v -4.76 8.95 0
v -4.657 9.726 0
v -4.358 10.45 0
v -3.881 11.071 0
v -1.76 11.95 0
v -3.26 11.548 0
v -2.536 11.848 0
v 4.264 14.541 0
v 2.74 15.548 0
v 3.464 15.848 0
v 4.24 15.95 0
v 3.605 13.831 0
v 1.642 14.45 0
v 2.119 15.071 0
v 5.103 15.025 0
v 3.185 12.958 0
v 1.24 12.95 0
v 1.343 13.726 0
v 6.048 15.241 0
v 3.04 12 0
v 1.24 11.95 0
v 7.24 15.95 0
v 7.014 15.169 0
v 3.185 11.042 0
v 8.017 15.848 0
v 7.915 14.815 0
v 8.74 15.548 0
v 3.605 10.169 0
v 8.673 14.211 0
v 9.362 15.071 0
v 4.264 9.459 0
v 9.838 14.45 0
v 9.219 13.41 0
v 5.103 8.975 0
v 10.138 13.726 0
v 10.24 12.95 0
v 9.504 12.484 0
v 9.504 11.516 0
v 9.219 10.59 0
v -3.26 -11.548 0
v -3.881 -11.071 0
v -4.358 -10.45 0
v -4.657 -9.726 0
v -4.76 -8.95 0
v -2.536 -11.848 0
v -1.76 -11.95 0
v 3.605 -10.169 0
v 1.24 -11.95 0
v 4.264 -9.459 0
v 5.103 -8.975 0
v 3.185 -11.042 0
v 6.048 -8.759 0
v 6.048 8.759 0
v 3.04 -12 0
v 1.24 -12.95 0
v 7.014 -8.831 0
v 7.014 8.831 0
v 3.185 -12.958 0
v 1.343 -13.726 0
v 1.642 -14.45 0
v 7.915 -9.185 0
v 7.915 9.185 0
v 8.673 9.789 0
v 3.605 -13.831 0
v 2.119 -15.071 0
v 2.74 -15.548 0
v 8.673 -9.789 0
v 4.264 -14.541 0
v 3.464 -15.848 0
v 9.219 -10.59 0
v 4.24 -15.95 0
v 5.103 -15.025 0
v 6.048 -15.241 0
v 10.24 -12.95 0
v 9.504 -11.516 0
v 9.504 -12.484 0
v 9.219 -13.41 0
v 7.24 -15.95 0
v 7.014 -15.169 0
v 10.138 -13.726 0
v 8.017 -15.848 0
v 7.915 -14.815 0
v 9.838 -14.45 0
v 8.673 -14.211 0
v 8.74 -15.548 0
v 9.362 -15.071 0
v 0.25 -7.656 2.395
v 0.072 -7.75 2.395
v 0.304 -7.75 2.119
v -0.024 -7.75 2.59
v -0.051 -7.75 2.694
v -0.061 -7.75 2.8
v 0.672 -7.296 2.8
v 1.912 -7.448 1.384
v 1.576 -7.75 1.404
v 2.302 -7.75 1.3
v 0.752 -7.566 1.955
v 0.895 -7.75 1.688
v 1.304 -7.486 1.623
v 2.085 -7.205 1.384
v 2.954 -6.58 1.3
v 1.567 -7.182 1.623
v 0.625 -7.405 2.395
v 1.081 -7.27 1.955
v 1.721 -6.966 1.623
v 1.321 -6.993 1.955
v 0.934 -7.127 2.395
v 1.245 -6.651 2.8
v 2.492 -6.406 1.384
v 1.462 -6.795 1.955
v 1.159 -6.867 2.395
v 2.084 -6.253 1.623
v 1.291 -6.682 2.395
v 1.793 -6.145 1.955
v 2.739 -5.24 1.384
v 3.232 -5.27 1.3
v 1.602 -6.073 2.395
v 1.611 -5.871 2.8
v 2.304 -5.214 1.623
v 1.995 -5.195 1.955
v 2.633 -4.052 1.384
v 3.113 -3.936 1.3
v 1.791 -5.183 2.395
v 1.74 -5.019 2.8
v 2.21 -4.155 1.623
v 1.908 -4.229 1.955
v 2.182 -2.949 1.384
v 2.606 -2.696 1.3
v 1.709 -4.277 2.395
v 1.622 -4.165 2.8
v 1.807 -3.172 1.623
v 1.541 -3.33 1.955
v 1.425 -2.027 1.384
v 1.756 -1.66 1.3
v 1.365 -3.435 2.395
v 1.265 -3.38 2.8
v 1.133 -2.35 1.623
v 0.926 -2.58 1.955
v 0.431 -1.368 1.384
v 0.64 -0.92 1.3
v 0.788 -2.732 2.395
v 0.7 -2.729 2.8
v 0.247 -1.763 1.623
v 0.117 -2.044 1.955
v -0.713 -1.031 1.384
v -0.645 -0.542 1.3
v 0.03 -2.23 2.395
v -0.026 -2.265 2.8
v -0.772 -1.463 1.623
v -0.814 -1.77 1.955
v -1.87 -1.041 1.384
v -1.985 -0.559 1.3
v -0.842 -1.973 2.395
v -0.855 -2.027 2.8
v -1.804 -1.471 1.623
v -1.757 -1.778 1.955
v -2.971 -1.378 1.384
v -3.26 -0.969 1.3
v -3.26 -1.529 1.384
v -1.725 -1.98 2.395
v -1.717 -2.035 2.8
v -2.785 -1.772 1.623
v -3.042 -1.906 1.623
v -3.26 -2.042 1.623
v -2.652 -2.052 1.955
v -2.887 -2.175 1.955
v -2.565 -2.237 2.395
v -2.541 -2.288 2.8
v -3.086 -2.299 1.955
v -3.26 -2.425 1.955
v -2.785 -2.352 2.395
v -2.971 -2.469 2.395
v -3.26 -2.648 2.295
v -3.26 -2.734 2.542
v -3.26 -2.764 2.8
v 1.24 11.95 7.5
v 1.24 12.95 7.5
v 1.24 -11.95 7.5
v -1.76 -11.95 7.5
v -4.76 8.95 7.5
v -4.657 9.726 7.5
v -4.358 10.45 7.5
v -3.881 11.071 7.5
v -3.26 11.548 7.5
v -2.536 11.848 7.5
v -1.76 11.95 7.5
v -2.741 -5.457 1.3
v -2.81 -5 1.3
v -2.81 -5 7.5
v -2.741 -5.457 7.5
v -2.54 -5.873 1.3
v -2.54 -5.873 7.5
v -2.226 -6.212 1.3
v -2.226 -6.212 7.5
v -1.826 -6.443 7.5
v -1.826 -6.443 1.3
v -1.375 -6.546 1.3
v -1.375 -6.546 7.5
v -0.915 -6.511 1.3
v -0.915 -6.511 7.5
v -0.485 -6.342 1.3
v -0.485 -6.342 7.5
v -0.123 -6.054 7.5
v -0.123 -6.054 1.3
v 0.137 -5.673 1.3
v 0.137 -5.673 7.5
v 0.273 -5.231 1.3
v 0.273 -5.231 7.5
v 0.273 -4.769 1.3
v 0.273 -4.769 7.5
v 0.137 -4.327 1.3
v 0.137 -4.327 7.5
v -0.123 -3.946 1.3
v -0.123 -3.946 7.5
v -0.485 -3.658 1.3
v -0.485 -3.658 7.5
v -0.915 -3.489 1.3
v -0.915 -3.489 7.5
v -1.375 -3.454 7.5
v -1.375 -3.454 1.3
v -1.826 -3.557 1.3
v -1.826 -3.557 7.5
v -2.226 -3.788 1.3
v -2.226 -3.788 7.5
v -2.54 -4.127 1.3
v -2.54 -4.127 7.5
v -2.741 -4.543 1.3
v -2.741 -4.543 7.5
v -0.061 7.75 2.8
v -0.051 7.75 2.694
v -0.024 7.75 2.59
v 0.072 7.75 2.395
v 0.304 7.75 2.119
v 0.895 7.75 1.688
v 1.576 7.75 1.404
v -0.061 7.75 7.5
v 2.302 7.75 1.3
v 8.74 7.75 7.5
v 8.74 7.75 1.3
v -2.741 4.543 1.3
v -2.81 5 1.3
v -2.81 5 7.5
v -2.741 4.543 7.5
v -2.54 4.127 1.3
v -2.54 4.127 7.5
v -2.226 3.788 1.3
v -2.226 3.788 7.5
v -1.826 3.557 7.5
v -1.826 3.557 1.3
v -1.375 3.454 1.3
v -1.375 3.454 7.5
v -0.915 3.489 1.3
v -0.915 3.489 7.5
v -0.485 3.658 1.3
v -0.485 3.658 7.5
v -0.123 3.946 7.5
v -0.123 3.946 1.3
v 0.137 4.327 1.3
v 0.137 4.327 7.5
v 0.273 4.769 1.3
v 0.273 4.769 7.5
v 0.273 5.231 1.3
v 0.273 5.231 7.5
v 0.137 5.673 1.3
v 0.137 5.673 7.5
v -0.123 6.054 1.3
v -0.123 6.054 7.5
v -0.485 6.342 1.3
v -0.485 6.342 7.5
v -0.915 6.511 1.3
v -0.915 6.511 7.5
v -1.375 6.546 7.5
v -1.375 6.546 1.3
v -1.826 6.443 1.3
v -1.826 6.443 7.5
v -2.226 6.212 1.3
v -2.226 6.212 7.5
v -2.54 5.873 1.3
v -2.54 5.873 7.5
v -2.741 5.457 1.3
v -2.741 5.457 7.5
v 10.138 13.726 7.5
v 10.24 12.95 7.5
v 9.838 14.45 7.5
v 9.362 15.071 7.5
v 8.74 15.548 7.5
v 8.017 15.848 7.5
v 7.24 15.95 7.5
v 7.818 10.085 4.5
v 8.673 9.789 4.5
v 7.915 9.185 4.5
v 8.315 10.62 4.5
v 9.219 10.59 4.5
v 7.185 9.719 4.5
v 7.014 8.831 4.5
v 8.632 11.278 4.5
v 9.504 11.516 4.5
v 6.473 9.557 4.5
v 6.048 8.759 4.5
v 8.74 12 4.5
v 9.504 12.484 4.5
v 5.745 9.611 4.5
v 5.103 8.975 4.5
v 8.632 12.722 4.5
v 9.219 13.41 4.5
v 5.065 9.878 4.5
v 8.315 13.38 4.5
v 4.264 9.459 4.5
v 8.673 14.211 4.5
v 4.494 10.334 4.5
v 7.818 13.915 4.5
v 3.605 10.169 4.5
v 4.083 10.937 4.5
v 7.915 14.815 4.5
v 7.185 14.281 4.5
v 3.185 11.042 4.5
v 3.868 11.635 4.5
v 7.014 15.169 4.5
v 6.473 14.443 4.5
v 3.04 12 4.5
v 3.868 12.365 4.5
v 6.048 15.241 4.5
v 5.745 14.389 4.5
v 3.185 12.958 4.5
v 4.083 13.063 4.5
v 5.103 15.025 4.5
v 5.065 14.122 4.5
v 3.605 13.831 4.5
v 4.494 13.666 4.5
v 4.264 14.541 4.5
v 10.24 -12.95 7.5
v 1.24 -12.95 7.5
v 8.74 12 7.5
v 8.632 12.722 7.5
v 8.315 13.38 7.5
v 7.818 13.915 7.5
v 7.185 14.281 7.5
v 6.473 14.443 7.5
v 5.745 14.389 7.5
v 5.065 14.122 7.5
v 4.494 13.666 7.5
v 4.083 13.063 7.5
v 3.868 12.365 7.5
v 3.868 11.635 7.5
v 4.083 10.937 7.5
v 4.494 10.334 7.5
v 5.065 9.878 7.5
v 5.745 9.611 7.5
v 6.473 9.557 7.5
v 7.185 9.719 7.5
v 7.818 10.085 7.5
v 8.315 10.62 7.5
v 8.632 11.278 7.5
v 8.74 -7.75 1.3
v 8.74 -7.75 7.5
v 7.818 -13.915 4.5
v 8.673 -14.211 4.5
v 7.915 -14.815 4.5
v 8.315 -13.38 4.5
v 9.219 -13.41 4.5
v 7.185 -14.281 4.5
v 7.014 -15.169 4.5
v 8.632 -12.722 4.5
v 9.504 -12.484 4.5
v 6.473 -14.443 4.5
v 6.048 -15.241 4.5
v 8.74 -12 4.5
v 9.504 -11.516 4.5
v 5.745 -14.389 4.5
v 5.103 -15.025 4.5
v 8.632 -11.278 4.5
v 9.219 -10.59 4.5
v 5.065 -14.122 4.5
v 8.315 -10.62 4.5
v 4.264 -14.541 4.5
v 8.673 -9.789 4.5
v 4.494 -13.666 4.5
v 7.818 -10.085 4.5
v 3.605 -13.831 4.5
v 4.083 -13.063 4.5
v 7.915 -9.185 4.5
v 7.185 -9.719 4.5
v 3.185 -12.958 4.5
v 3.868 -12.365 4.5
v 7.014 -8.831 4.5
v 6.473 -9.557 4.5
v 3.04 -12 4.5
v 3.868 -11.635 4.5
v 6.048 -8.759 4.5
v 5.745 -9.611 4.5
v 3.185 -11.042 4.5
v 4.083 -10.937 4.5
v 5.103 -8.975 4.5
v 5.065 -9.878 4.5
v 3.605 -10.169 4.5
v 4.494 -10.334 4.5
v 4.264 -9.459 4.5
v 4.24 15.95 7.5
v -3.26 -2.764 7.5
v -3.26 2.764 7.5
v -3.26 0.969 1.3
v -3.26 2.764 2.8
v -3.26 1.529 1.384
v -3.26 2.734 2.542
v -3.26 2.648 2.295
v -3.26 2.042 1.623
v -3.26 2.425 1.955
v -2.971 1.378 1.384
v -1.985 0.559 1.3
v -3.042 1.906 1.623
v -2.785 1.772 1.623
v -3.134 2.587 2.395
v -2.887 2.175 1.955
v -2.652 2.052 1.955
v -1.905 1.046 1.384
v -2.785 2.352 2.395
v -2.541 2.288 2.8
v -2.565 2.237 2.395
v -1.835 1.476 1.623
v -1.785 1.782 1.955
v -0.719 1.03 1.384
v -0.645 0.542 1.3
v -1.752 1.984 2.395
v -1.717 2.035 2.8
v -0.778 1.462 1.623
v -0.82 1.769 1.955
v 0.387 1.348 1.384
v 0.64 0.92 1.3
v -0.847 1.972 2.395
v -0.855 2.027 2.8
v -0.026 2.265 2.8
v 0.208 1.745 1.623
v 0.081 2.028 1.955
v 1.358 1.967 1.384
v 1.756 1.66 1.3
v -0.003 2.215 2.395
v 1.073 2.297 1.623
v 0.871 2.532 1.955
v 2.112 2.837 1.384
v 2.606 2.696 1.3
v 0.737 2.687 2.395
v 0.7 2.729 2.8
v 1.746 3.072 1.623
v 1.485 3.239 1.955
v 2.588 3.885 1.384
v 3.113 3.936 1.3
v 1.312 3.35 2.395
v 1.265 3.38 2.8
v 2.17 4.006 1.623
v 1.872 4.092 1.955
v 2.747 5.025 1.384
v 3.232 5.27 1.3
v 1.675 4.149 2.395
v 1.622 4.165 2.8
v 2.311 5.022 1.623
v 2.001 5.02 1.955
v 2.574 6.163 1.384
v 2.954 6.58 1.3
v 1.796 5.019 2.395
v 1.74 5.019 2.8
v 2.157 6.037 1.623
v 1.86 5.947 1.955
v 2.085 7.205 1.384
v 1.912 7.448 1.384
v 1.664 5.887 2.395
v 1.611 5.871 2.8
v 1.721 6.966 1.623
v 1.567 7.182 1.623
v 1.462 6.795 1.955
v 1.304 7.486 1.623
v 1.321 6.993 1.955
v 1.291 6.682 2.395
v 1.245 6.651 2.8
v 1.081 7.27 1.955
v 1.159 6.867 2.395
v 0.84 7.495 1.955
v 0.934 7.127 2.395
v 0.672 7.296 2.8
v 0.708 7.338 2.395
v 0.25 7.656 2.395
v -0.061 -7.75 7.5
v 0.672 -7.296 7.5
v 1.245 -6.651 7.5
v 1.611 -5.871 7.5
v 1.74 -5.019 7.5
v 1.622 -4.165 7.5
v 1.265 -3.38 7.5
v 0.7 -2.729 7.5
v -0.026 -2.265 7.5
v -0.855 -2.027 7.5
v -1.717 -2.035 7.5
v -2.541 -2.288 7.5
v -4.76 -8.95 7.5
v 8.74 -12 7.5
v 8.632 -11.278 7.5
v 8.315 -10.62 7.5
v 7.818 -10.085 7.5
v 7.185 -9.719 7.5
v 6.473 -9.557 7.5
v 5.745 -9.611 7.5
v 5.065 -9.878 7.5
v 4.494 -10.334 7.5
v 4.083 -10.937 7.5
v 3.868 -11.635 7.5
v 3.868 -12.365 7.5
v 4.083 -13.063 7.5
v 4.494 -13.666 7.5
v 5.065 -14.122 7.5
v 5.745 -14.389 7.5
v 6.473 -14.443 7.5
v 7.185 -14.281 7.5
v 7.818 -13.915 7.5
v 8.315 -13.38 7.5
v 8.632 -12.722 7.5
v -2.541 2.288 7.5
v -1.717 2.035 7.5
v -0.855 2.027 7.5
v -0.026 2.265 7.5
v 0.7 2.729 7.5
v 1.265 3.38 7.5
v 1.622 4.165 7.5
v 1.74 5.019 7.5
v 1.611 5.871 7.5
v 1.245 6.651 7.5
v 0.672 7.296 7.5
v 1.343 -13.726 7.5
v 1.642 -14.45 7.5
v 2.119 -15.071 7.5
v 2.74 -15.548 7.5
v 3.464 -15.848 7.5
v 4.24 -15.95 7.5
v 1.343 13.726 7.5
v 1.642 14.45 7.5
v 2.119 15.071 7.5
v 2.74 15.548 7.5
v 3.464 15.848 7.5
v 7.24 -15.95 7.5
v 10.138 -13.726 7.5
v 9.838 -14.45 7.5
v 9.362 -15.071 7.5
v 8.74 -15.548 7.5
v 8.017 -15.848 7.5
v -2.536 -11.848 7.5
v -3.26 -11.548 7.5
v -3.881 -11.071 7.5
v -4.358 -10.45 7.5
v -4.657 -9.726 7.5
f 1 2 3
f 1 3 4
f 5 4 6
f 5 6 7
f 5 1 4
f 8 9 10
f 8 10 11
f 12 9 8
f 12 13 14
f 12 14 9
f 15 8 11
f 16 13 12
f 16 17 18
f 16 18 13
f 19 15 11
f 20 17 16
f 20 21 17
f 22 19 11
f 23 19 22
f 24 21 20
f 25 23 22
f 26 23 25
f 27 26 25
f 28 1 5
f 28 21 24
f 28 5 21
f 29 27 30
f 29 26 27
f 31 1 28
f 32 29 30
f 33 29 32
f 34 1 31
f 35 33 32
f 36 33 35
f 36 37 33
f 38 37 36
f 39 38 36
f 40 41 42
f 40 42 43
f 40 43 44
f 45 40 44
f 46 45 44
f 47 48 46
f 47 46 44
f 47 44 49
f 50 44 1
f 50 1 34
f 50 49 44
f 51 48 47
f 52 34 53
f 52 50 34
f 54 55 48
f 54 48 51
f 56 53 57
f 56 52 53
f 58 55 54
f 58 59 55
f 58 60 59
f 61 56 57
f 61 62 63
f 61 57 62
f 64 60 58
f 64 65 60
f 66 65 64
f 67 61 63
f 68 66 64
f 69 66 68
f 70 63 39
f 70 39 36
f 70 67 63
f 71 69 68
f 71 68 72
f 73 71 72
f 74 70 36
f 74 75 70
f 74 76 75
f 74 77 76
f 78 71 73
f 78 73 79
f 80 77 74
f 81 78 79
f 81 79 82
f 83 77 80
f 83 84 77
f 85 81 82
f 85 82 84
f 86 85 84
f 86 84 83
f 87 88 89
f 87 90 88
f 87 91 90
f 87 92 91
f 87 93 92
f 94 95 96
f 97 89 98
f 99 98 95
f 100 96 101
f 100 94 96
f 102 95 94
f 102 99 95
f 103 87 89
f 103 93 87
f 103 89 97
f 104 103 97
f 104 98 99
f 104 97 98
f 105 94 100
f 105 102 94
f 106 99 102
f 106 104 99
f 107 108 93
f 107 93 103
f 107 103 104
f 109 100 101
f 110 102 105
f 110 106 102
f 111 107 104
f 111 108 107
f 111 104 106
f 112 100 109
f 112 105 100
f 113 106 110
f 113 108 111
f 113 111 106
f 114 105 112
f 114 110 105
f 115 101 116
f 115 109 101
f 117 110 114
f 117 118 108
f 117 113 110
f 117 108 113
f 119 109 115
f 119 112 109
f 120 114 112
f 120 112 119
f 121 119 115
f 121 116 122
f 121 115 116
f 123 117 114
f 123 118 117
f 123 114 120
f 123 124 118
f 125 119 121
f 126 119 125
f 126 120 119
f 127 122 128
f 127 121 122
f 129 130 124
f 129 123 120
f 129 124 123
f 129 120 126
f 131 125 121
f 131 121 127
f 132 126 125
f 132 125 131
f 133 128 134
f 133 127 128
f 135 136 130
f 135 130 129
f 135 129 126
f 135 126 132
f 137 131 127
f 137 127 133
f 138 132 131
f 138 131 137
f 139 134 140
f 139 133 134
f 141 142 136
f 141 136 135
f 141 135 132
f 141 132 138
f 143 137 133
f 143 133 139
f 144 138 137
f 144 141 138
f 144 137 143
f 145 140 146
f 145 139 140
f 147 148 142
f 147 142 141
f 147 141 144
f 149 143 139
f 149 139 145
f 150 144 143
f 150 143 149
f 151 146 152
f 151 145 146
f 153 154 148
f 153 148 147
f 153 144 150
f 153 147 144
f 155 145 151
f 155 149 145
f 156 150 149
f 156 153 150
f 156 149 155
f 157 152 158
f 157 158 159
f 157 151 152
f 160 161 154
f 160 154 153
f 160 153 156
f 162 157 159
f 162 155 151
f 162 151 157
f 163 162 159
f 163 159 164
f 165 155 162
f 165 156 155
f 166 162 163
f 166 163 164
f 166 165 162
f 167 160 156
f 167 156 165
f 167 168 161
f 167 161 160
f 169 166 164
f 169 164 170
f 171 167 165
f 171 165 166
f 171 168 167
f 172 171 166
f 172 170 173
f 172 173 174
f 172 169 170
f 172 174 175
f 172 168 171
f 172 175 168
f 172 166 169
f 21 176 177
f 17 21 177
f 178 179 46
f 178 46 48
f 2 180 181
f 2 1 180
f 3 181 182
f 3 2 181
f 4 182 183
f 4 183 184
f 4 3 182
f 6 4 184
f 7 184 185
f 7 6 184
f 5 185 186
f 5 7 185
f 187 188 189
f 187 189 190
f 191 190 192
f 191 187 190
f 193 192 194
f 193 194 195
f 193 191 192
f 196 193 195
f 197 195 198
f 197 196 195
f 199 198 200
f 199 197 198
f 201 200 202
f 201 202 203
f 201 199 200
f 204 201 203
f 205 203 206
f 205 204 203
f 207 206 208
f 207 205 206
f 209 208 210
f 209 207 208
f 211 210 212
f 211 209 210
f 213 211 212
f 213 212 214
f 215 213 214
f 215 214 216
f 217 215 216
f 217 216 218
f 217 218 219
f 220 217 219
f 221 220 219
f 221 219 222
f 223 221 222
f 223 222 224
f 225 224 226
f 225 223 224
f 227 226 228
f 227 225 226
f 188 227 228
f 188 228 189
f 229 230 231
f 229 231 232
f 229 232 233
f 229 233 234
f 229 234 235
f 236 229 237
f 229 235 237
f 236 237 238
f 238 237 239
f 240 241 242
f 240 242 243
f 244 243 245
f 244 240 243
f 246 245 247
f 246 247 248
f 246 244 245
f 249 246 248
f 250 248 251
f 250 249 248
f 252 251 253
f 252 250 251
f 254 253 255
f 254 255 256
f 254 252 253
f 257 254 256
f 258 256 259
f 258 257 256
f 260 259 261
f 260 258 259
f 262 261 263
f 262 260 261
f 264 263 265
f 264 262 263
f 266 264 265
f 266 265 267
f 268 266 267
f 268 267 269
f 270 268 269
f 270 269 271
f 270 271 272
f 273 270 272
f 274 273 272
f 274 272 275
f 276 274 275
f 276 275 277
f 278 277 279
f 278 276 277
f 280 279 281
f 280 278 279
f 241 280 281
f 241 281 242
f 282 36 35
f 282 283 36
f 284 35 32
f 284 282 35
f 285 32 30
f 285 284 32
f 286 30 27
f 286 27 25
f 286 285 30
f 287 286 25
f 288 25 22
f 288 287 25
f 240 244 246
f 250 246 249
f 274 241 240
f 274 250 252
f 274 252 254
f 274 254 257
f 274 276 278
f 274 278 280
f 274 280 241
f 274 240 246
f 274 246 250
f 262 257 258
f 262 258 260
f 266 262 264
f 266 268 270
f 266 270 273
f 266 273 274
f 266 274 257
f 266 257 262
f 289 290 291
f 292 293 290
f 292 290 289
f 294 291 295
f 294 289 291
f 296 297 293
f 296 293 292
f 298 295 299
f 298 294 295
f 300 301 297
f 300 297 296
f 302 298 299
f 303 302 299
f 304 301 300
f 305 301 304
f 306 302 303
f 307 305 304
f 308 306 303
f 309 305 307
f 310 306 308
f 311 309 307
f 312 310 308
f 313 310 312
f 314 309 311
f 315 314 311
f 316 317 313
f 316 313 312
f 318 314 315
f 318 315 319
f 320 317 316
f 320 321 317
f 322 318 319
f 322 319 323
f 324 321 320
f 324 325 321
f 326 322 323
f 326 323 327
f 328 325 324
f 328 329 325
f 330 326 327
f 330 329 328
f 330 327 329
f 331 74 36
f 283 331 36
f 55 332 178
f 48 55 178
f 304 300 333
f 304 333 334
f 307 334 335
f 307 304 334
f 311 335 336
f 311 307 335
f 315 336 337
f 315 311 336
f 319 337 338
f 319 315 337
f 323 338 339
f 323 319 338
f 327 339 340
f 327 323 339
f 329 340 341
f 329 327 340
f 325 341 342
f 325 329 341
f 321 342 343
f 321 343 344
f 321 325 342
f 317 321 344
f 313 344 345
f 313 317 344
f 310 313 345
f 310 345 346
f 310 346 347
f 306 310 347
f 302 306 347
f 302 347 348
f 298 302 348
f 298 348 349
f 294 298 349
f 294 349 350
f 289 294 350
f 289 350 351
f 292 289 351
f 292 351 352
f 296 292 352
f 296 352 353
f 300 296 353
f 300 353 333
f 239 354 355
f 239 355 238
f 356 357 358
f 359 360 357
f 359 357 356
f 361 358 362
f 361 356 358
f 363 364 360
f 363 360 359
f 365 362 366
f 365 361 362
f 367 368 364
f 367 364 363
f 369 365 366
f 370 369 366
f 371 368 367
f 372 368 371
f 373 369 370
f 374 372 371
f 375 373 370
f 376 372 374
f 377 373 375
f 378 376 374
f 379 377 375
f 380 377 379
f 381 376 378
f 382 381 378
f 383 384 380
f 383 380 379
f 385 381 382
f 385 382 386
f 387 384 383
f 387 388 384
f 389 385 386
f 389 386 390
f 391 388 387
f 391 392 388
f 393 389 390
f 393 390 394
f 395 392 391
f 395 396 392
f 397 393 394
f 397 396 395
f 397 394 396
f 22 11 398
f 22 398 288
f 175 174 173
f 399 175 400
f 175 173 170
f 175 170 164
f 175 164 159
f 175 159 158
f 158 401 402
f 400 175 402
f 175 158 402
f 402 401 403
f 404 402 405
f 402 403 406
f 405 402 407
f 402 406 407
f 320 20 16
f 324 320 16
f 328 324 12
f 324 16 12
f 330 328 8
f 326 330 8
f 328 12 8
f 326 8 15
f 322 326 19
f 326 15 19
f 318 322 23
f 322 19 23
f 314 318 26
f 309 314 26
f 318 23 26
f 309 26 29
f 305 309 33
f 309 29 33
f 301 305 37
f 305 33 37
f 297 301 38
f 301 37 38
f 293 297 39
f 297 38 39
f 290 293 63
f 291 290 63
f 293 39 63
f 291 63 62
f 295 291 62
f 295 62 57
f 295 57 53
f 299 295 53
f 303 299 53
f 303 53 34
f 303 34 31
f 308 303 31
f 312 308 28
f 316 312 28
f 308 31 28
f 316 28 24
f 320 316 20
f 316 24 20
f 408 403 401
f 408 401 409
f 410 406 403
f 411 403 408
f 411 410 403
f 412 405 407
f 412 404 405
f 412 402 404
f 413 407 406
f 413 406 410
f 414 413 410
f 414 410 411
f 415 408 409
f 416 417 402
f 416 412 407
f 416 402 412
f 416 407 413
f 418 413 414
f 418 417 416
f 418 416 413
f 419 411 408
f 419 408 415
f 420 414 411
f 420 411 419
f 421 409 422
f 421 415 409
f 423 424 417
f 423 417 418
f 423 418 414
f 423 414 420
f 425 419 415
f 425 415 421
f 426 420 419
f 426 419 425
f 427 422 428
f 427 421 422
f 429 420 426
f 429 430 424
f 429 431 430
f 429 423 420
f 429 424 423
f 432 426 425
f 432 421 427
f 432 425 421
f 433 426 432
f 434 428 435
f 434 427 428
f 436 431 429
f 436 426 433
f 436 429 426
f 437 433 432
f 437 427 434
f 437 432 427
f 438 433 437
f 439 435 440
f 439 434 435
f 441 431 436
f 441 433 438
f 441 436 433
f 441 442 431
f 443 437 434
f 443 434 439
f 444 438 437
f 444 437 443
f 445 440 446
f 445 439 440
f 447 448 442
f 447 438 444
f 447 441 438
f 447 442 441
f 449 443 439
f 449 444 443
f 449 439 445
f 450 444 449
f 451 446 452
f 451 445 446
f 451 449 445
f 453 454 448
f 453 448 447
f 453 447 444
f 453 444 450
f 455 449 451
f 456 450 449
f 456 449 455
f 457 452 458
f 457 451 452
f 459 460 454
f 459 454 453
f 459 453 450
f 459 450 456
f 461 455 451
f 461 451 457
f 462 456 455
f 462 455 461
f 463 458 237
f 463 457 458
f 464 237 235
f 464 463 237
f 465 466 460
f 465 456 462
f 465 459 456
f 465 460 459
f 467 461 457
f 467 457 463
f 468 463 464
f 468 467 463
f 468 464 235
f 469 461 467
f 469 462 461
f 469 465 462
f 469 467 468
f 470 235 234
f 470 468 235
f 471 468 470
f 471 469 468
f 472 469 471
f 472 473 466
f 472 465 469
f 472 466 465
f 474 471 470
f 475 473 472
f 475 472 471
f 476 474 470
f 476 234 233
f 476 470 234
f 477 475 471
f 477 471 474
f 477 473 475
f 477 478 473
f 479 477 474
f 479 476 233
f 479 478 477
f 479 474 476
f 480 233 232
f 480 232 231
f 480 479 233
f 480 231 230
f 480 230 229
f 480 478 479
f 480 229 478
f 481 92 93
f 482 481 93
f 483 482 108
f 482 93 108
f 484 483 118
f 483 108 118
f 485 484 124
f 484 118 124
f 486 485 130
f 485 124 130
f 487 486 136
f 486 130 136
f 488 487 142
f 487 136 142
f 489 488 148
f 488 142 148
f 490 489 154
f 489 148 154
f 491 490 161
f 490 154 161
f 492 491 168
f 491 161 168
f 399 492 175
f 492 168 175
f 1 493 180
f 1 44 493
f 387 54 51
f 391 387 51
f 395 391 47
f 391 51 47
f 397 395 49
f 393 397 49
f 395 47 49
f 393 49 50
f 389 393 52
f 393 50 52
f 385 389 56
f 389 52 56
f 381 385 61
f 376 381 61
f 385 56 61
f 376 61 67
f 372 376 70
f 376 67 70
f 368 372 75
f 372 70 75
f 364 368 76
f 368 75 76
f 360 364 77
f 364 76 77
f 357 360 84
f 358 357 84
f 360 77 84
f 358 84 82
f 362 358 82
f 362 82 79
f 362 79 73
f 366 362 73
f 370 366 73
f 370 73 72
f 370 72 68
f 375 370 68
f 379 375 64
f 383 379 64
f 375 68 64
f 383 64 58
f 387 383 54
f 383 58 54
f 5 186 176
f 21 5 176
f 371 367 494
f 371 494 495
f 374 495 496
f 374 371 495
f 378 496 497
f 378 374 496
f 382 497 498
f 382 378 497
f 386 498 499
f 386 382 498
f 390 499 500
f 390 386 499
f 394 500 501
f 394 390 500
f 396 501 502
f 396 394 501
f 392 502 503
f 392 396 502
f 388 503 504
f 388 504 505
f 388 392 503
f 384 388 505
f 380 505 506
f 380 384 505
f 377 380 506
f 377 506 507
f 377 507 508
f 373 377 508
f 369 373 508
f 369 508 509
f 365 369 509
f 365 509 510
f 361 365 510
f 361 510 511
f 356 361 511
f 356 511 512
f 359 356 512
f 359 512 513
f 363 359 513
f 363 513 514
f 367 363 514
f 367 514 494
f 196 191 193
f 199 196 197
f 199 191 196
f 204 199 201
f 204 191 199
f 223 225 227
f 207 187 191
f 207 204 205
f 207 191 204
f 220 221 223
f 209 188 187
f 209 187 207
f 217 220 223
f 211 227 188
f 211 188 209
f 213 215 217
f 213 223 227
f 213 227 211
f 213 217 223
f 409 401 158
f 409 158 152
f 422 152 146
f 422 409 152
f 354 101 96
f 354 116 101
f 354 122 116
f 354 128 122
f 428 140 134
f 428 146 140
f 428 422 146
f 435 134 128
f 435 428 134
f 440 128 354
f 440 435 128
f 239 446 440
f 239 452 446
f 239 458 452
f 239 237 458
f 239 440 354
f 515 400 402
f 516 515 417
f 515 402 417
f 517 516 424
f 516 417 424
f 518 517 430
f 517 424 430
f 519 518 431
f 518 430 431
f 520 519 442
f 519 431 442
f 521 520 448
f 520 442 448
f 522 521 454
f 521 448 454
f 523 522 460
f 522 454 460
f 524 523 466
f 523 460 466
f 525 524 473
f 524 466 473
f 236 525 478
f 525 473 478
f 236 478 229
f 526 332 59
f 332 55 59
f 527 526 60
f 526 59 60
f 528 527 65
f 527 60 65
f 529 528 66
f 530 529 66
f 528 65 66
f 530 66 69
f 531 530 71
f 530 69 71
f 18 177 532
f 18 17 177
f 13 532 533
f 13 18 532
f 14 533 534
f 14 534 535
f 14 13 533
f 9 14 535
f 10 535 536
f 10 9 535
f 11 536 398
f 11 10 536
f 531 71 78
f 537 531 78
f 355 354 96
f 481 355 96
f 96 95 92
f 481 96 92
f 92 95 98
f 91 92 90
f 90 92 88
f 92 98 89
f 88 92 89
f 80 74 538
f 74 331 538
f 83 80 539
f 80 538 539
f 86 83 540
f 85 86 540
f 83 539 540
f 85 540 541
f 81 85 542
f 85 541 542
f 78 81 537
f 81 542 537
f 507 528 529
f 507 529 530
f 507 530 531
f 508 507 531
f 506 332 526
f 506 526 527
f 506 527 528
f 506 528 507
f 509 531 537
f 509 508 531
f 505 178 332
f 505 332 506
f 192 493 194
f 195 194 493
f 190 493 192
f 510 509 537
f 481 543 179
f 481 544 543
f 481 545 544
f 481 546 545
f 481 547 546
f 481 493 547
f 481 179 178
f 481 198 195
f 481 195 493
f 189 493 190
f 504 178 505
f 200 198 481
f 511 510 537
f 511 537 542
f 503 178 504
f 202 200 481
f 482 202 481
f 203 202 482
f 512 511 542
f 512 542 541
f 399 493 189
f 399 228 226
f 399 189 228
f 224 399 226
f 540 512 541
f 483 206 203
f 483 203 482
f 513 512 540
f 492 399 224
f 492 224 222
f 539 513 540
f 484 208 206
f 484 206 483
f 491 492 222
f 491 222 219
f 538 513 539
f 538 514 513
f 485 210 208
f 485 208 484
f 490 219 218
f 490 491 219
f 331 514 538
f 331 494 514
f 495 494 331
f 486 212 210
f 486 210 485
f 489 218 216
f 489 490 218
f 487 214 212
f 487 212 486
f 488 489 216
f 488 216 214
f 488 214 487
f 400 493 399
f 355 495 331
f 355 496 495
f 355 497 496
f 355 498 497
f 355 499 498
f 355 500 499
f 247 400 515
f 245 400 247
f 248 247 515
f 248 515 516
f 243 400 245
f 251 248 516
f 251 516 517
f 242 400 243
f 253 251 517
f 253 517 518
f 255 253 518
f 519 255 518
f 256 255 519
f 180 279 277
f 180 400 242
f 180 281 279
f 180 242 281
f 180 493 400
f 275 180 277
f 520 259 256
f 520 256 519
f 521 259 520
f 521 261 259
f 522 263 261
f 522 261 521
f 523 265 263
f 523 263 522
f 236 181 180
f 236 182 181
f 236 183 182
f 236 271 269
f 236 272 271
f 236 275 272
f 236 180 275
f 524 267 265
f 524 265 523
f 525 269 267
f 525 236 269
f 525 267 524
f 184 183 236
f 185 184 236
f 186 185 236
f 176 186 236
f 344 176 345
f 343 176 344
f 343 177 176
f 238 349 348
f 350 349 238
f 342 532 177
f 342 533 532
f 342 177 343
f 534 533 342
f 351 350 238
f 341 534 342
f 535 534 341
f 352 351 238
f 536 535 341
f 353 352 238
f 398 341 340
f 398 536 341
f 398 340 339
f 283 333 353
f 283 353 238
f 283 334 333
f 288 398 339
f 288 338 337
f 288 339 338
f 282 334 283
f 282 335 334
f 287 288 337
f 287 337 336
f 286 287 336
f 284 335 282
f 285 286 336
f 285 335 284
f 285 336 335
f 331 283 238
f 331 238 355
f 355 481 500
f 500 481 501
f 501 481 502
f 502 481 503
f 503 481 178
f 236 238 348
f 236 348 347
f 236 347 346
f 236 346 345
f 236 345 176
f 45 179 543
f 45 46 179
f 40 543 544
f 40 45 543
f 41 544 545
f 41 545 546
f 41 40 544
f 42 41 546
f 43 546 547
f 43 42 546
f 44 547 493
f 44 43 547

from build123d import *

# Parameters (mm, degrees)
SKETCH1_W                       = 20.480821918
SKETCH1_H                       = 31.9
SKETCH1_R                       = 2.45
BOSS_EXTRUDE1_DEPTH             = 7.5
SKETCH2_W                       = 18.980821918
SKETCH2_H                       = 9.35
CUT_EXTRUDE1_DEPTH              = 6.2
CUT_EXTRUDE2_REACH              = 22.384
SKETCH5_W                       = 5.480821918
SKETCH5_H                       = 31.9
SKETCH3_R                       = 3
SKETCH3_R_2                     = 1.55
BOSS_EXTRUDE4_DEPTH             = 6.2
SKETCH6_W                       = 1.5
SKETCH6_H                       = 15.5
CUT_EXTRUDE3_DEPTH              = 6.2
SKETCH7_W                       = 1.5
SKETCH7_H                       = 18.7
BOSS_EXTRUDE5_DEPTH             = 6.2
FILLET1_R                       = 3
SKETCH8_W                       = 6
SKETCH8_H                       = 4
CUT_EXTRUDE4_DEPTH              = 7.5
FILLET2_R                       = 3
BOSS_EXTRUDE6_REACH             = 21.943
BOSS_EXTRUDE6_DIRECTION_2_REACH = 21.943
SKETCH10_R                      = 3.25
CUT_EXTRUDE6_DEPTH              = 4.5
FILLET3_R                       = 1.5
SKETCH12_W                      = 1.5
SKETCH12_H                      = 15.5
BOSS_EXTRUDE7_DEPTH             = 6.2


with BuildPart() as part:
    # Sketch1 → Boss-Extrude1 (new body)
    with BuildSketch(Plane.XY):
        Rectangle(SKETCH1_W, SKETCH1_H)
        with Locations((6.290410959, 12)):
            Circle(SKETCH1_R, mode=Mode.SUBTRACT)
        with Locations((6.290410959, -12)):
            Circle(SKETCH1_R, mode=Mode.SUBTRACT)
    extrude(amount=BOSS_EXTRUDE1_DEPTH)

    # Sketch2 → Cut-Extrude1 (cut)
    with BuildSketch(Plane.XY.offset(7.5)):
        with Locations((-0.75, 4.675)):
            Rectangle(SKETCH2_W, SKETCH2_H)
        with Locations((-0.75, -4.675)):
            Rectangle(SKETCH2_W, SKETCH2_H)
    extrude(amount=-CUT_EXTRUDE1_DEPTH, mode=Mode.SUBTRACT)

    # Cut-Extrude2: up to this face of the body (flat: up to its plane)
    cut_extrude2_end = Plane(part.part.faces().sort_by_distance((-0.385368256, 0, 0))[0])
    # Sketch5 → Cut-Extrude2 (cut, up to the picked face)
    with BuildSketch(Plane.XY.offset(7.5), mode=Mode.PRIVATE) as cut_extrude2_sk1:
        with Locations((-7.5, 0)):
            Rectangle(SKETCH5_W, SKETCH5_H)
    cut_extrude2_tool1 = split(extrude(cut_extrude2_sk1.sketch, amount=-CUT_EXTRUDE2_REACH, mode=Mode.PRIVATE), bisect_by=cut_extrude2_end, keep=Keep.BOTH, mode=Mode.PRIVATE)
    add(cut_extrude2_tool1.solids().sort_by(Axis((-7.5, 0, 7.5), (0, 0, -1)))[0], mode=Mode.SUBTRACT)

    # Sketch3 → Boss-Extrude4 (add)
    # profile 1 of 2: a face of its own
    with BuildSketch(Plane.XY.offset(1.3)):
        with Locations(Location((-1.259589041, 5, 0), (0, 0, 180))):
            Circle(SKETCH3_R)
        with Locations(Location((-1.259589041, 5, 0), (0, 0, 180))):
            Circle(SKETCH3_R_2, mode=Mode.SUBTRACT)
    # profile 2 of 2: a face of its own
    with BuildSketch(Plane.XY.offset(1.3)):
        with Locations(Location((-1.259589041, -5, 0), (0, 0, 180))):
            Circle(SKETCH3_R)
        with Locations(Location((-1.259589041, -5, 0), (0, 0, 180))):
            Circle(SKETCH3_R_2, mode=Mode.SUBTRACT)
    extrude(amount=BOSS_EXTRUDE4_DEPTH)

    # Sketch6 → Cut-Extrude3 (cut)
    with BuildSketch(Plane.XY.offset(7.5)):
        with Locations((9.490410959, 0)):
            Rectangle(SKETCH6_W, SKETCH6_H)
    extrude(amount=-CUT_EXTRUDE3_DEPTH, mode=Mode.SUBTRACT)

    # Sketch7 → Boss-Extrude5 (add)
    with BuildSketch(Plane.XY.offset(1.3)):
        with Locations((-4.009589041, 0)):
            Rectangle(SKETCH7_W, SKETCH7_H)
    extrude(amount=BOSS_EXTRUDE5_DEPTH)

    # Fillet1
    fillet1_edges = [part.edges().sort_by_distance(p)[0] for p in [
        (10.240410959, 15.95, 3.75),
        (10.240410959, -15.95, 3.75),
    ]]
    fillet(fillet1_edges, radius=FILLET1_R)

    # Sketch8 → Cut-Extrude4 (cut)
    with BuildSketch(Plane.XY.offset(7.5)):
        with Locations((-1.759589041, 13.95)):
            Rectangle(SKETCH8_W, SKETCH8_H)
        with Locations((-1.759589041, -13.95)):
            Rectangle(SKETCH8_W, SKETCH8_H)
    extrude(amount=-CUT_EXTRUDE4_DEPTH, mode=Mode.SUBTRACT)

    # Fillet2
    fillet2_edges = [part.edges().sort_by_distance(p)[0] for p in [
        (1.240410959, 15.95, 3.75),
        (-4.759589041, 11.95, 3.75),
        (1.240410959, -15.95, 3.75),
        (-4.759589041, -11.95, 3.75),
    ]]
    fillet(fillet2_edges, radius=FILLET2_R)

    # Boss-Extrude6: up to this face of the body (flat: up to its plane)
    boss_extrude6_end = Plane(part.part.faces().sort_by_distance((5.740410959, -15.597493262, 7.5))[0])
    # Sketch11 → Boss-Extrude6 (add, up to the picked face)
    with BuildSketch(Plane.XY.offset(1.3), mode=Mode.PRIVATE) as boss_extrude6_sk1:
        with BuildLine():
            Line((-3.259589041, 9.35), (-3.259589041, 7.236067977))
            ThreePointArc((-3.259589041, 7.236067977), (-1.735455251, 7.962018121), (-0.06063116, 7.75))
            Line((-0.06063116, 7.75), (8.740410959, 7.75))
            Line((8.740410959, 7.75), (8.740410959, 9.35))
            Line((8.740410959, 9.35), (-3.259589041, 9.35))
        make_face()
    boss_extrude6_tool1 = split(extrude(boss_extrude6_sk1.sketch, amount=BOSS_EXTRUDE6_REACH, mode=Mode.PRIVATE), bisect_by=boss_extrude6_end, keep=Keep.BOTH, mode=Mode.PRIVATE)
    # Sketch11 → Boss-Extrude6 (add, up to the picked face)
    with BuildSketch(Plane.XY.offset(1.3), mode=Mode.PRIVATE) as boss_extrude6_sk2:
        with BuildLine():
            Line((-3.259589041, -7.236067977), (-3.259589041, -9.35))
            Line((-3.259589041, -9.35), (8.740410959, -9.35))
            Line((8.740410959, -9.35), (8.740410959, -7.75))
            Line((8.740410959, -7.75), (-0.06063116, -7.75))
            ThreePointArc((-0.06063116, -7.75), (-1.735455251, -7.962018121), (-3.259589041, -7.236067977))
        make_face()
    boss_extrude6_tool2 = split(extrude(boss_extrude6_sk2.sketch, amount=BOSS_EXTRUDE6_REACH, mode=Mode.PRIVATE), bisect_by=boss_extrude6_end, keep=Keep.BOTH, mode=Mode.PRIVATE)
    add(boss_extrude6_tool1.solids().sort_by(Axis((2.770321, 8.555653, 1.3), (0, 0, 1)))[0])
    add(boss_extrude6_tool2.solids().sort_by(Axis((2.770321, -8.555653, 1.3), (0, 0, 1)))[0])

    # Boss-Extrude6 direction 2: up to this face of the body (flat: up to its plane)
    boss_extrude6_direction_2_end = Plane(part.part.faces().sort_by_distance((2.964227546, 0, 0))[0])
    # Sketch11 → Boss-Extrude6 direction 2 (add, up to the picked face)
    with BuildSketch(Plane.XY.offset(1.3), mode=Mode.PRIVATE) as boss_extrude6_direction_2_sk1:
        with BuildLine():
            Line((-3.259589041, 9.35), (-3.259589041, 7.236067977))
            ThreePointArc((-3.259589041, 7.236067977), (-1.735455251, 7.962018121), (-0.06063116, 7.75))
            Line((-0.06063116, 7.75), (8.740410959, 7.75))
            Line((8.740410959, 7.75), (8.740410959, 9.35))
            Line((8.740410959, 9.35), (-3.259589041, 9.35))
        make_face()
    boss_extrude6_direction_2_tool1 = split(extrude(boss_extrude6_direction_2_sk1.sketch, amount=-BOSS_EXTRUDE6_DIRECTION_2_REACH, mode=Mode.PRIVATE), bisect_by=boss_extrude6_direction_2_end, keep=Keep.BOTH, mode=Mode.PRIVATE)
    # Sketch11 → Boss-Extrude6 direction 2 (add, up to the picked face)
    with BuildSketch(Plane.XY.offset(1.3), mode=Mode.PRIVATE) as boss_extrude6_direction_2_sk2:
        with BuildLine():
            Line((-3.259589041, -7.236067977), (-3.259589041, -9.35))
            Line((-3.259589041, -9.35), (8.740410959, -9.35))
            Line((8.740410959, -9.35), (8.740410959, -7.75))
            Line((8.740410959, -7.75), (-0.06063116, -7.75))
            ThreePointArc((-0.06063116, -7.75), (-1.735455251, -7.962018121), (-3.259589041, -7.236067977))
        make_face()
    boss_extrude6_direction_2_tool2 = split(extrude(boss_extrude6_direction_2_sk2.sketch, amount=-BOSS_EXTRUDE6_DIRECTION_2_REACH, mode=Mode.PRIVATE), bisect_by=boss_extrude6_direction_2_end, keep=Keep.BOTH, mode=Mode.PRIVATE)
    add(boss_extrude6_direction_2_tool1.solids().sort_by(Axis((2.770321, 8.555653, 1.3), (0, 0, -1)))[0])
    add(boss_extrude6_direction_2_tool2.solids().sort_by(Axis((2.770321, -8.555653, 1.3), (0, 0, -1)))[0])

    # Sketch10 → Cut-Extrude6 (cut)
    with BuildSketch(Plane(origin=(0, 0, 0), x_dir=(-1, 0, 0), z_dir=(0, 0, -1))):
        with Locations((-6.290410959, 12)):
            Circle(SKETCH10_R)
        with Locations((-6.290410959, -12)):
            Circle(SKETCH10_R)
    extrude(amount=-CUT_EXTRUDE6_DEPTH, mode=Mode.SUBTRACT)

    # Fillet3
    fillet3_edges = [part.edges().sort_by_distance(p)[0] for p in [
        (1.265413056, 3.380010984, 1.3),
        (1.265413056, -3.380010984, 1.3),
    ]]
    fillet(fillet3_edges, radius=FILLET3_R)

    # Sketch12 → Boss-Extrude7 (add)
    with BuildSketch(Plane.XY.offset(1.3)):
        with Locations((9.490410959, 0)):
            Rectangle(SKETCH12_W, SKETCH12_H)
    extrude(amount=BOSS_EXTRUDE7_DEPTH)


solid = part.part
